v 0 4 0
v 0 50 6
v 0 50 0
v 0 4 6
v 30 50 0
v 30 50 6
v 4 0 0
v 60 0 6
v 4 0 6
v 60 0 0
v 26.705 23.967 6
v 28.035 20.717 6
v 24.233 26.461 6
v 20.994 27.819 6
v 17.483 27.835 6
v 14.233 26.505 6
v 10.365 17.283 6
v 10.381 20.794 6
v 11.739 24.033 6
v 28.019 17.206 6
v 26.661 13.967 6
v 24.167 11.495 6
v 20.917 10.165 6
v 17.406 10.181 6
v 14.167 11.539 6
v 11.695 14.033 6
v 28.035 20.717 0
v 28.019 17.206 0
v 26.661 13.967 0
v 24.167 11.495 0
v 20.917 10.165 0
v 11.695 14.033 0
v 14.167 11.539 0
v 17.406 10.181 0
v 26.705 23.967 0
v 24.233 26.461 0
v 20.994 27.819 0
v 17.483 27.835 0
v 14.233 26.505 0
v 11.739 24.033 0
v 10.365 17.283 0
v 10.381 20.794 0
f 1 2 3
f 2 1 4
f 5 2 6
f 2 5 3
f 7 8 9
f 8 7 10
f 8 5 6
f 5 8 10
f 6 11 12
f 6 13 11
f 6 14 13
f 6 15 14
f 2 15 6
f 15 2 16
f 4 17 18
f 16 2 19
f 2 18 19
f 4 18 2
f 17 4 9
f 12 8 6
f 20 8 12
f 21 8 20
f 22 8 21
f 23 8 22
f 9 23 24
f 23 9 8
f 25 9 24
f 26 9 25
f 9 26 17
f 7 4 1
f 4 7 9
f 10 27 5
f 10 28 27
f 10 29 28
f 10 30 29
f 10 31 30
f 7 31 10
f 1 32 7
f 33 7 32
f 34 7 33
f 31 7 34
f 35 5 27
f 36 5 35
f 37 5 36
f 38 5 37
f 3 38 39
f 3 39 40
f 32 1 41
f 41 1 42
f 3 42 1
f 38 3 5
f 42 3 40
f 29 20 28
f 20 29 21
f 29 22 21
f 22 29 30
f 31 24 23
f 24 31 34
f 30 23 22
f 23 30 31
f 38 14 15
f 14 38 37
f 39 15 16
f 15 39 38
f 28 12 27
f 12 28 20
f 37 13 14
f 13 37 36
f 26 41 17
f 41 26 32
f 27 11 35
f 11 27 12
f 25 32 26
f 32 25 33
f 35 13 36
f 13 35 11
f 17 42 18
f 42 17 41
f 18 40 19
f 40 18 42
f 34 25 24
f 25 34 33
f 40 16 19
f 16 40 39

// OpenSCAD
$fn = 32;

// ----------------------------------------------------------------------
// Bracket plate: gusset 60 x 50
// ----------------------------------------------------------------------

// --- parameters (mm) ---
hole_r = 3;               // bolt hole radius
plate_t = 6;              // plate thickness, Z (extrusion height)
gus_a = 60;               // base length
gus_b = 50;               // height
top_x = 30;               // top edge X of the angled cut
light_r = 9;              // lightening hole radius

light_d = 2 * light_r;

profile = [[4, 0], [30, 0], [60, 0], [30, 50], [0, 50], [0, 4]];  // primary outline, 6 points, counter clockwise
void_1 = [[28.035, 20.717], [26.705, 23.967], [24.233, 26.461], [20.994, 27.819], [17.483, 27.835], [14.233, 26.505], [11.739, 24.033], [10.381, 20.794], [10.365, 17.283], [11.695, 14.033], [14.167, 11.539], [17.406, 10.181], [20.917, 10.165], [24.167, 11.495], [26.661, 13.967], [28.019, 17.206]];  // lightening hole, 16 points

// --- the one profile operation ---
difference() {
  linear_extrude(height = plate_t) polygon(points = profile);
  translate([0, 0, -1])
    linear_extrude(height = plate_t + 2) polygon(points = void_1);
}
